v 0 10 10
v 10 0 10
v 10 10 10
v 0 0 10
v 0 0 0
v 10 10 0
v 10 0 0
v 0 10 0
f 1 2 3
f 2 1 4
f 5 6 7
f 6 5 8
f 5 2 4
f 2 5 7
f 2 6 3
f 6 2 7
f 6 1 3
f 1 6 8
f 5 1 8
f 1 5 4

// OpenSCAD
// [FarmRTK PARAMS BEGIN]
// AUTO-SYNCED - run parse_cad_params.ps1 after editing @part_id@.md
/* [Export] */
PART = "all"; // [all, body]
/* [Visibility] */
SHOW_BASE = true;
// [FarmRTK PARAMS END]

// FarmRTK @part_id@ - parametric part (single-file)
// Params MUST stay at top of file (lines 1-8) for OpenSCAD Customizer

$fn = 48;

module part_body() {
    color("RoyalBlue") cube([10, 10, 10]);
}

if (PART == "all") {
    part_body();
} else {
    part_body();
}

echo(str("FarmRTK @part_id@ PART=", PART));
